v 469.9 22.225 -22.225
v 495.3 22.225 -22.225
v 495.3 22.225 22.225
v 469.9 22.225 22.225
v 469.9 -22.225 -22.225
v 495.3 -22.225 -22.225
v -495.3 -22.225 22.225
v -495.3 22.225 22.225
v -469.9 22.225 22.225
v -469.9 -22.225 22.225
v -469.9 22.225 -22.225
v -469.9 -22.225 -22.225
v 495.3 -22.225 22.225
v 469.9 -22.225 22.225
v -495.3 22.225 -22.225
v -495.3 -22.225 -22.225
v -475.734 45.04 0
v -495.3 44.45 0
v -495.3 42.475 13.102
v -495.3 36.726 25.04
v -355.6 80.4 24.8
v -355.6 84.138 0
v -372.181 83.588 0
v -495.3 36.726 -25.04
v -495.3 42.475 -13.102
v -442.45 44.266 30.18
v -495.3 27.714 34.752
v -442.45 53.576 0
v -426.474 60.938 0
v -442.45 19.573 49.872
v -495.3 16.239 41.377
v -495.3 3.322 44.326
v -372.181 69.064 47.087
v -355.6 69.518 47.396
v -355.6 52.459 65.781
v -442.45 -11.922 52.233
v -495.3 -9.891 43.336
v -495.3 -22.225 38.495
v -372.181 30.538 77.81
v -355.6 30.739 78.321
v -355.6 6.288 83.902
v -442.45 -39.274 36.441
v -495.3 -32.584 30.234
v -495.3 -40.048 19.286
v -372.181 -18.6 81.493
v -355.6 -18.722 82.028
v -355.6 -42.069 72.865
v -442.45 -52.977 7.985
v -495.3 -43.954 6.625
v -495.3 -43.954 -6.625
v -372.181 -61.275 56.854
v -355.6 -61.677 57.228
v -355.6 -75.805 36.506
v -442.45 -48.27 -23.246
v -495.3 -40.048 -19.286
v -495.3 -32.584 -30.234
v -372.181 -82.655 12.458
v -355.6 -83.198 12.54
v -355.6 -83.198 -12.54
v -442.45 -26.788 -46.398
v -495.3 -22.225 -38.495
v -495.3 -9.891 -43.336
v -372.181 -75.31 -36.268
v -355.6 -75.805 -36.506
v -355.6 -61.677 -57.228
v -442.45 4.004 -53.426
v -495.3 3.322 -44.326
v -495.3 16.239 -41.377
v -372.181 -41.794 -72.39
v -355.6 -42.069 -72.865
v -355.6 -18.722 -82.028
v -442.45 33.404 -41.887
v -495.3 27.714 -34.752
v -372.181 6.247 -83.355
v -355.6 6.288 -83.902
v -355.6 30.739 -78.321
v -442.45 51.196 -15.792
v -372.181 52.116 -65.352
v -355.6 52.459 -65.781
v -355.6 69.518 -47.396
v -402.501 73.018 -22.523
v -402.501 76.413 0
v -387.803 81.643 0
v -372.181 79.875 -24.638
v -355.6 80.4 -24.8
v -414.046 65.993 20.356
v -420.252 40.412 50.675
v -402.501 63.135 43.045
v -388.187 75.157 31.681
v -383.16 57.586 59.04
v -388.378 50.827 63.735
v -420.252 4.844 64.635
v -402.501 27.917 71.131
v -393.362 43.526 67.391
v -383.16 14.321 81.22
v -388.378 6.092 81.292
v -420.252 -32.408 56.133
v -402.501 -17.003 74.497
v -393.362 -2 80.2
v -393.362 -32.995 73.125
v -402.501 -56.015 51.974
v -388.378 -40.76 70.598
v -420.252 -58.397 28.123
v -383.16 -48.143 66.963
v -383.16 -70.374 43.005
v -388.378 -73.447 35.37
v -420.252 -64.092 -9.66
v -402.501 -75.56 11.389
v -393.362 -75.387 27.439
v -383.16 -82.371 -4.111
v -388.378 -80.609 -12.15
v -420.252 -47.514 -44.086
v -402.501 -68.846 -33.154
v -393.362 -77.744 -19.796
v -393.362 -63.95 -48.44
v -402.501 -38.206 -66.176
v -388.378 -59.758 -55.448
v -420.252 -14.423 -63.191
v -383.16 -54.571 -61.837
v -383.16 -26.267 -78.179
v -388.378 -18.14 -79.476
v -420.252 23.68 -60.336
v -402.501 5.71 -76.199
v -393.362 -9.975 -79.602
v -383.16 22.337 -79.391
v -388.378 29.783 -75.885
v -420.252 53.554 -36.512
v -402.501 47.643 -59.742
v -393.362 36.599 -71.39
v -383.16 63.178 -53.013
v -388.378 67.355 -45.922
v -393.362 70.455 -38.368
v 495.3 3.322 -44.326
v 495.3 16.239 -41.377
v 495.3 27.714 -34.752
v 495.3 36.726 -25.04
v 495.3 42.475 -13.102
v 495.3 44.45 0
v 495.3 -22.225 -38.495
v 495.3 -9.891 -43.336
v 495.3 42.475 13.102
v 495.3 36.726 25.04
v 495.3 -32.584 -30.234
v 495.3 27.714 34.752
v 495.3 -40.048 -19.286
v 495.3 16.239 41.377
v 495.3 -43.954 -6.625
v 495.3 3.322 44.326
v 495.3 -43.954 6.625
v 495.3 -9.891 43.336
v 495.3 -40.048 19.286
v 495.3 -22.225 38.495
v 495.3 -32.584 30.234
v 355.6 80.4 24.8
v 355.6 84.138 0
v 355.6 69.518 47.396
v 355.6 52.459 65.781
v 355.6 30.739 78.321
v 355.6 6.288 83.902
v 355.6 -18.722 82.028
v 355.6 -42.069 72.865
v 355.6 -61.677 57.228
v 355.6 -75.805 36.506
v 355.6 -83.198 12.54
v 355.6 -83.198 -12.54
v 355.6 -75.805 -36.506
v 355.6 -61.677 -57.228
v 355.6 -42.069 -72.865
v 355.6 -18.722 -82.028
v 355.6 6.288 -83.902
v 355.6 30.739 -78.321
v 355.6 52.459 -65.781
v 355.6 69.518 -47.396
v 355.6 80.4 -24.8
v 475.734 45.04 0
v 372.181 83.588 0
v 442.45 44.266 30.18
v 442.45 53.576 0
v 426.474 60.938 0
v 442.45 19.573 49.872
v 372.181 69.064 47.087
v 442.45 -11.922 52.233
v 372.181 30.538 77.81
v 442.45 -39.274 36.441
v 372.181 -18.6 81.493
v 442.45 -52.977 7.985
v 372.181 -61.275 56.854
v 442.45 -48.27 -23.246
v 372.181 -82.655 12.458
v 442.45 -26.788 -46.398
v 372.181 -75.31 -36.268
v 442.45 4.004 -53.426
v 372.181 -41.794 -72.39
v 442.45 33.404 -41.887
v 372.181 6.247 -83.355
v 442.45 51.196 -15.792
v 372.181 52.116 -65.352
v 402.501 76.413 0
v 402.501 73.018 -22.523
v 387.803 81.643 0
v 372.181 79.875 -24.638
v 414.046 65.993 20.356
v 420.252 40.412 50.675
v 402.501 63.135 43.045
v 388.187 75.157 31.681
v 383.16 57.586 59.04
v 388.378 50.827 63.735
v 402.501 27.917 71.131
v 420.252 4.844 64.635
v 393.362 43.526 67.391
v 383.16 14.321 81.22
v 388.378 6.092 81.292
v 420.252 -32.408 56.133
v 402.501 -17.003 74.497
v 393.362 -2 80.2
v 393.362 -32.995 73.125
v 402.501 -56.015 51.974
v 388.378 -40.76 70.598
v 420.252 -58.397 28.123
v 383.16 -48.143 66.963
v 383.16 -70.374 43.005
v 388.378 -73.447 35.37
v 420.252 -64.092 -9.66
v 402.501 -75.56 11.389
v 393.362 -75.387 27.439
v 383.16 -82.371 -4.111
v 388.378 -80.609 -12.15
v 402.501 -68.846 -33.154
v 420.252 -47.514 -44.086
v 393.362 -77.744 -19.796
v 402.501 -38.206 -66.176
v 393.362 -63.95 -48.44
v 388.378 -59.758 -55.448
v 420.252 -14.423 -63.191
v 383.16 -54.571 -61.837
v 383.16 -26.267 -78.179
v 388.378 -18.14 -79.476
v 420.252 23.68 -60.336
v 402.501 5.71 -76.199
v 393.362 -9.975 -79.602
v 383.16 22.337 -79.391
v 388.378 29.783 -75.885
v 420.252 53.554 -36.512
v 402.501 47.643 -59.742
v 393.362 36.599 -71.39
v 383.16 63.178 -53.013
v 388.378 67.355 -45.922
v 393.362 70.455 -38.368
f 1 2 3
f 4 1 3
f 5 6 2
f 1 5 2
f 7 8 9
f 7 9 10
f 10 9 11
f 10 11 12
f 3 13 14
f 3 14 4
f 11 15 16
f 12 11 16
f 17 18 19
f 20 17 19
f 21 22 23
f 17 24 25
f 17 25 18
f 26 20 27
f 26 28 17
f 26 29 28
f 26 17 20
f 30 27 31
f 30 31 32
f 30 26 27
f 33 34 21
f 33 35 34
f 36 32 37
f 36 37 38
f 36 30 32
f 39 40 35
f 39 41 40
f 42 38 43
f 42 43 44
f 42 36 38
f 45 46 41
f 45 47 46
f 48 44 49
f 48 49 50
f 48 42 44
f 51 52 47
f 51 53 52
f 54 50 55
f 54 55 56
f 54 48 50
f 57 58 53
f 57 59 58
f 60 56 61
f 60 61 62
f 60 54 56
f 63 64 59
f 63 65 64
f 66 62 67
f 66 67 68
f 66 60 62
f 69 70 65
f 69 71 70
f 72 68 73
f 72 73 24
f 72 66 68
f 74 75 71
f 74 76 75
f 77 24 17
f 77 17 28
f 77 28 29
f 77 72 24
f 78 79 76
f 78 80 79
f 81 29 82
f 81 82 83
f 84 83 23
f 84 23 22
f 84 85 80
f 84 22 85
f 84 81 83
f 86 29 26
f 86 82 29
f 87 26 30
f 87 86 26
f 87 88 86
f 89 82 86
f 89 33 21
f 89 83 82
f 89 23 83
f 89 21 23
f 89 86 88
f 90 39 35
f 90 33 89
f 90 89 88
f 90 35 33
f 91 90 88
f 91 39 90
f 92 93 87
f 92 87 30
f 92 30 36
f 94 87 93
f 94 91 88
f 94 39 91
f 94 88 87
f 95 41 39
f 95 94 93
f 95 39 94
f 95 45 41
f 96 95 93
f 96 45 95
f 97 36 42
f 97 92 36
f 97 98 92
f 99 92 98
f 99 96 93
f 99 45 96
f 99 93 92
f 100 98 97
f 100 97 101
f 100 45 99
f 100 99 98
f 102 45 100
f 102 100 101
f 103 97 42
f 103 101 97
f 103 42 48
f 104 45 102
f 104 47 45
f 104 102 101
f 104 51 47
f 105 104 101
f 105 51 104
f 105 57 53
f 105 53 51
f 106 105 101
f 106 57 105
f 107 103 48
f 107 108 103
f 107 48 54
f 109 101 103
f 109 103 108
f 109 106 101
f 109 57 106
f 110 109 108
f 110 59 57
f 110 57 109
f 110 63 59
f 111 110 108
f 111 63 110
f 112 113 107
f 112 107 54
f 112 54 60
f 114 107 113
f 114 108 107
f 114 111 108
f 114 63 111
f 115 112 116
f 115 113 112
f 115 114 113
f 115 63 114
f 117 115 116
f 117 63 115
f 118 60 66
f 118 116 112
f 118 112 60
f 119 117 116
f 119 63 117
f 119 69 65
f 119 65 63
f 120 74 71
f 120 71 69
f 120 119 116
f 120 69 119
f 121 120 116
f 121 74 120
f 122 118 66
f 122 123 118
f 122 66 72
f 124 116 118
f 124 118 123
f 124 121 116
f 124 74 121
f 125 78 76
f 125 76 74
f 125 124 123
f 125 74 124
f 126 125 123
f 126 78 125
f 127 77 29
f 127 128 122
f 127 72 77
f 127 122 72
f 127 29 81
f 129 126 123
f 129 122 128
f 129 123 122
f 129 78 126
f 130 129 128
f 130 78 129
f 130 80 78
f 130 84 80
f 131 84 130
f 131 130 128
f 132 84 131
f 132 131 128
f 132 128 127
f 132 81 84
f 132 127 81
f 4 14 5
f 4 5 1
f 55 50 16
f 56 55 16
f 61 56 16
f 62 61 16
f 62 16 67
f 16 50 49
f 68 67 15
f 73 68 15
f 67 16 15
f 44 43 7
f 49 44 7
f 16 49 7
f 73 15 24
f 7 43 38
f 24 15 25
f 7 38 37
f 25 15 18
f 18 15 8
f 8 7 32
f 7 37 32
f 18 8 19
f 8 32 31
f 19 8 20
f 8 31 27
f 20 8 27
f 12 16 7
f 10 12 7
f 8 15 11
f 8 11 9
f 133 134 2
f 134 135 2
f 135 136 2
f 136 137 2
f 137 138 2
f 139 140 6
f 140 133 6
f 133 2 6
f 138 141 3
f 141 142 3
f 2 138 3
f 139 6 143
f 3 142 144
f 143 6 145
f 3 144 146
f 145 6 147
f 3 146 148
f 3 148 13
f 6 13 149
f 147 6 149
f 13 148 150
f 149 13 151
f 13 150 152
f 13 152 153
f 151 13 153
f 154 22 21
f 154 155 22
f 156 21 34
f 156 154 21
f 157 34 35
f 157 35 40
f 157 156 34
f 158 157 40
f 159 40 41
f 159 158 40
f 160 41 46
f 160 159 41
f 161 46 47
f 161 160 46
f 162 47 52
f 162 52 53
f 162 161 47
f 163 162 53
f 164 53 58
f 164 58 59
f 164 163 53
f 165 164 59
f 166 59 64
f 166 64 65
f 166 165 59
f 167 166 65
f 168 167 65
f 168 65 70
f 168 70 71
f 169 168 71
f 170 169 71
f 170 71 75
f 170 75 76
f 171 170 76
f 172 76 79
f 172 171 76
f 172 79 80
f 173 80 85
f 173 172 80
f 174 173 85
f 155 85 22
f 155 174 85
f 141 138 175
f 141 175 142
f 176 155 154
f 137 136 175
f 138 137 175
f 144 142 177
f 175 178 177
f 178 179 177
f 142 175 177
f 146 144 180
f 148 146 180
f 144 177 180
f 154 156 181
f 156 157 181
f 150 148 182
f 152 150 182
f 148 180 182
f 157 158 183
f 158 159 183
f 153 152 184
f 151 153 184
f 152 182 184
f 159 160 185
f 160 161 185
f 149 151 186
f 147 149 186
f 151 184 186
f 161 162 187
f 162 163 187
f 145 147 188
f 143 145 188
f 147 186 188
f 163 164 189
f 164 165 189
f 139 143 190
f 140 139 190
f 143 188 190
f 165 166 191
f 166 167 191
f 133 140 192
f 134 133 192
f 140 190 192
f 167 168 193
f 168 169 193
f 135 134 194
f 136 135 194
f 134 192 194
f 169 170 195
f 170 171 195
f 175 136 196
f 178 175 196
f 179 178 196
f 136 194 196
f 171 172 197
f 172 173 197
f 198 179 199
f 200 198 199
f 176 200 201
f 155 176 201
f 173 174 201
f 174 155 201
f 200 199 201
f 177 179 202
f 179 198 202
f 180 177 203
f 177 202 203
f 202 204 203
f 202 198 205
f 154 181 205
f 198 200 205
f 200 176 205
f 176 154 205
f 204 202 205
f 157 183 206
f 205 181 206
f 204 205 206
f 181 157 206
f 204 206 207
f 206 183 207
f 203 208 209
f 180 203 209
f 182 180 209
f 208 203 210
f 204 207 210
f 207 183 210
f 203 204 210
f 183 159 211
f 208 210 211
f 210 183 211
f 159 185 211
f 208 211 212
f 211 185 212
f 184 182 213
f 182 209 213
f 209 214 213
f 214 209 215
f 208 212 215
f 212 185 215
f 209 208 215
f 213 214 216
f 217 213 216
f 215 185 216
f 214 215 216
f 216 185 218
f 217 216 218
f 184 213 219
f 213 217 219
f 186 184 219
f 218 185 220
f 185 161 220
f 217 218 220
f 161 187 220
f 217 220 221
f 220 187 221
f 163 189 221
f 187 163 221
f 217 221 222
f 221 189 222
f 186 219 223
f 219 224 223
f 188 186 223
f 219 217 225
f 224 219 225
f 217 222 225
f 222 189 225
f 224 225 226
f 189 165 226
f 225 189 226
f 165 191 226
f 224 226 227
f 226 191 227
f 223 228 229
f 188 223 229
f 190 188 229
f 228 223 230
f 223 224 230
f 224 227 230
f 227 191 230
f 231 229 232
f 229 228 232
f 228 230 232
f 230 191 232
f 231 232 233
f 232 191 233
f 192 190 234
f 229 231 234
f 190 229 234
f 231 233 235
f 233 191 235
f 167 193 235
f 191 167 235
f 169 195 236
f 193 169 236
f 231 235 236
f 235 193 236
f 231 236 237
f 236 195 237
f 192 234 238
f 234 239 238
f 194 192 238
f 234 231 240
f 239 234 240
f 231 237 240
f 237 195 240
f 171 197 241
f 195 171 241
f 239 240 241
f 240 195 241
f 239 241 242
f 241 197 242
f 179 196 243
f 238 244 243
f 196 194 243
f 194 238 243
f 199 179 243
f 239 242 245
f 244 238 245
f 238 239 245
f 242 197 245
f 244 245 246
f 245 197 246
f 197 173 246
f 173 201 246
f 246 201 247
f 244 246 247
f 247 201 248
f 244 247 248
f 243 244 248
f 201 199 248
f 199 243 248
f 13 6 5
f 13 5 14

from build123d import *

# Parameters (mm, degrees)
F0_W     = 711.2
F0_H     = 84.1375
F2_W     = 44.45
F2_H     = 44.45
F3_DEPTH = 25.4
F4_W     = 44.45
F4_H     = 44.45
F5_DEPTH = 25.4


with BuildPart() as f1:
    # F0 (on Top) → F1 (revolve)
    with BuildSketch(Plane.XY):
        with Locations((0, 42.06875)):
            Rectangle(F0_W, F0_H)
        with BuildLine():
            add(Edge.make_bspline(
                [(495.3, 44.45), (491.1825215885, 44.0904084612), (479.4418370711, 43.0650598398), (427.3573599541, 55.187373247), (400.0577825465, 83.2970238087), (370.6219245107, 83.8535099048), (355.6, 84.1375)],
                knots=[0, 0, 0, 0, 0.1628231526, 0.4642781518, 0.7266064691, 1, 1, 1, 1], degree=3))
            Line((355.6, 84.1375), (355.6, 0))
            Line((355.6, 0), (495.3, 0))
            Line((495.3, 0), (495.3, 44.45))
        make_face()
        with BuildLine():
            Line((-355.6, 0), (-355.6, 84.1375))
            add(Edge.make_bspline(
                [(-495.3, 44.45), (-491.1825215885, 44.0904084612), (-479.4418370711, 43.0650598398), (-427.3573599541, 55.187373247), (-400.0577825465, 83.2970238087), (-370.6219245107, 83.8535099048), (-355.6, 84.1375)],
                knots=[0, 0, 0, 0, 0.1628231526, 0.4642781518, 0.7266064691, 1, 1, 1, 1], degree=3))
            Line((-495.3, 44.45), (-495.3, 0))
            Line((-495.3, 0), (-355.6, 0))
        make_face()
    revolve(axis=Axis((0, 0, 0), (1, 0, 0)))

    # F2 (on face) → F3 (cut)
    with BuildSketch(Plane(origin=(-495.3, 0, 0), x_dir=(0, -1, 0), z_dir=(-1, 0, 0))):
        Rectangle(F2_W, F2_H)
    extrude(amount=-F3_DEPTH, mode=Mode.SUBTRACT)

    # F4 (on face) → F5 (cut)
    with BuildSketch(Plane.YZ.offset(495.3)):
        Rectangle(F4_W, F4_H)
    extrude(amount=-F5_DEPTH, mode=Mode.SUBTRACT)


solid = f1.part
